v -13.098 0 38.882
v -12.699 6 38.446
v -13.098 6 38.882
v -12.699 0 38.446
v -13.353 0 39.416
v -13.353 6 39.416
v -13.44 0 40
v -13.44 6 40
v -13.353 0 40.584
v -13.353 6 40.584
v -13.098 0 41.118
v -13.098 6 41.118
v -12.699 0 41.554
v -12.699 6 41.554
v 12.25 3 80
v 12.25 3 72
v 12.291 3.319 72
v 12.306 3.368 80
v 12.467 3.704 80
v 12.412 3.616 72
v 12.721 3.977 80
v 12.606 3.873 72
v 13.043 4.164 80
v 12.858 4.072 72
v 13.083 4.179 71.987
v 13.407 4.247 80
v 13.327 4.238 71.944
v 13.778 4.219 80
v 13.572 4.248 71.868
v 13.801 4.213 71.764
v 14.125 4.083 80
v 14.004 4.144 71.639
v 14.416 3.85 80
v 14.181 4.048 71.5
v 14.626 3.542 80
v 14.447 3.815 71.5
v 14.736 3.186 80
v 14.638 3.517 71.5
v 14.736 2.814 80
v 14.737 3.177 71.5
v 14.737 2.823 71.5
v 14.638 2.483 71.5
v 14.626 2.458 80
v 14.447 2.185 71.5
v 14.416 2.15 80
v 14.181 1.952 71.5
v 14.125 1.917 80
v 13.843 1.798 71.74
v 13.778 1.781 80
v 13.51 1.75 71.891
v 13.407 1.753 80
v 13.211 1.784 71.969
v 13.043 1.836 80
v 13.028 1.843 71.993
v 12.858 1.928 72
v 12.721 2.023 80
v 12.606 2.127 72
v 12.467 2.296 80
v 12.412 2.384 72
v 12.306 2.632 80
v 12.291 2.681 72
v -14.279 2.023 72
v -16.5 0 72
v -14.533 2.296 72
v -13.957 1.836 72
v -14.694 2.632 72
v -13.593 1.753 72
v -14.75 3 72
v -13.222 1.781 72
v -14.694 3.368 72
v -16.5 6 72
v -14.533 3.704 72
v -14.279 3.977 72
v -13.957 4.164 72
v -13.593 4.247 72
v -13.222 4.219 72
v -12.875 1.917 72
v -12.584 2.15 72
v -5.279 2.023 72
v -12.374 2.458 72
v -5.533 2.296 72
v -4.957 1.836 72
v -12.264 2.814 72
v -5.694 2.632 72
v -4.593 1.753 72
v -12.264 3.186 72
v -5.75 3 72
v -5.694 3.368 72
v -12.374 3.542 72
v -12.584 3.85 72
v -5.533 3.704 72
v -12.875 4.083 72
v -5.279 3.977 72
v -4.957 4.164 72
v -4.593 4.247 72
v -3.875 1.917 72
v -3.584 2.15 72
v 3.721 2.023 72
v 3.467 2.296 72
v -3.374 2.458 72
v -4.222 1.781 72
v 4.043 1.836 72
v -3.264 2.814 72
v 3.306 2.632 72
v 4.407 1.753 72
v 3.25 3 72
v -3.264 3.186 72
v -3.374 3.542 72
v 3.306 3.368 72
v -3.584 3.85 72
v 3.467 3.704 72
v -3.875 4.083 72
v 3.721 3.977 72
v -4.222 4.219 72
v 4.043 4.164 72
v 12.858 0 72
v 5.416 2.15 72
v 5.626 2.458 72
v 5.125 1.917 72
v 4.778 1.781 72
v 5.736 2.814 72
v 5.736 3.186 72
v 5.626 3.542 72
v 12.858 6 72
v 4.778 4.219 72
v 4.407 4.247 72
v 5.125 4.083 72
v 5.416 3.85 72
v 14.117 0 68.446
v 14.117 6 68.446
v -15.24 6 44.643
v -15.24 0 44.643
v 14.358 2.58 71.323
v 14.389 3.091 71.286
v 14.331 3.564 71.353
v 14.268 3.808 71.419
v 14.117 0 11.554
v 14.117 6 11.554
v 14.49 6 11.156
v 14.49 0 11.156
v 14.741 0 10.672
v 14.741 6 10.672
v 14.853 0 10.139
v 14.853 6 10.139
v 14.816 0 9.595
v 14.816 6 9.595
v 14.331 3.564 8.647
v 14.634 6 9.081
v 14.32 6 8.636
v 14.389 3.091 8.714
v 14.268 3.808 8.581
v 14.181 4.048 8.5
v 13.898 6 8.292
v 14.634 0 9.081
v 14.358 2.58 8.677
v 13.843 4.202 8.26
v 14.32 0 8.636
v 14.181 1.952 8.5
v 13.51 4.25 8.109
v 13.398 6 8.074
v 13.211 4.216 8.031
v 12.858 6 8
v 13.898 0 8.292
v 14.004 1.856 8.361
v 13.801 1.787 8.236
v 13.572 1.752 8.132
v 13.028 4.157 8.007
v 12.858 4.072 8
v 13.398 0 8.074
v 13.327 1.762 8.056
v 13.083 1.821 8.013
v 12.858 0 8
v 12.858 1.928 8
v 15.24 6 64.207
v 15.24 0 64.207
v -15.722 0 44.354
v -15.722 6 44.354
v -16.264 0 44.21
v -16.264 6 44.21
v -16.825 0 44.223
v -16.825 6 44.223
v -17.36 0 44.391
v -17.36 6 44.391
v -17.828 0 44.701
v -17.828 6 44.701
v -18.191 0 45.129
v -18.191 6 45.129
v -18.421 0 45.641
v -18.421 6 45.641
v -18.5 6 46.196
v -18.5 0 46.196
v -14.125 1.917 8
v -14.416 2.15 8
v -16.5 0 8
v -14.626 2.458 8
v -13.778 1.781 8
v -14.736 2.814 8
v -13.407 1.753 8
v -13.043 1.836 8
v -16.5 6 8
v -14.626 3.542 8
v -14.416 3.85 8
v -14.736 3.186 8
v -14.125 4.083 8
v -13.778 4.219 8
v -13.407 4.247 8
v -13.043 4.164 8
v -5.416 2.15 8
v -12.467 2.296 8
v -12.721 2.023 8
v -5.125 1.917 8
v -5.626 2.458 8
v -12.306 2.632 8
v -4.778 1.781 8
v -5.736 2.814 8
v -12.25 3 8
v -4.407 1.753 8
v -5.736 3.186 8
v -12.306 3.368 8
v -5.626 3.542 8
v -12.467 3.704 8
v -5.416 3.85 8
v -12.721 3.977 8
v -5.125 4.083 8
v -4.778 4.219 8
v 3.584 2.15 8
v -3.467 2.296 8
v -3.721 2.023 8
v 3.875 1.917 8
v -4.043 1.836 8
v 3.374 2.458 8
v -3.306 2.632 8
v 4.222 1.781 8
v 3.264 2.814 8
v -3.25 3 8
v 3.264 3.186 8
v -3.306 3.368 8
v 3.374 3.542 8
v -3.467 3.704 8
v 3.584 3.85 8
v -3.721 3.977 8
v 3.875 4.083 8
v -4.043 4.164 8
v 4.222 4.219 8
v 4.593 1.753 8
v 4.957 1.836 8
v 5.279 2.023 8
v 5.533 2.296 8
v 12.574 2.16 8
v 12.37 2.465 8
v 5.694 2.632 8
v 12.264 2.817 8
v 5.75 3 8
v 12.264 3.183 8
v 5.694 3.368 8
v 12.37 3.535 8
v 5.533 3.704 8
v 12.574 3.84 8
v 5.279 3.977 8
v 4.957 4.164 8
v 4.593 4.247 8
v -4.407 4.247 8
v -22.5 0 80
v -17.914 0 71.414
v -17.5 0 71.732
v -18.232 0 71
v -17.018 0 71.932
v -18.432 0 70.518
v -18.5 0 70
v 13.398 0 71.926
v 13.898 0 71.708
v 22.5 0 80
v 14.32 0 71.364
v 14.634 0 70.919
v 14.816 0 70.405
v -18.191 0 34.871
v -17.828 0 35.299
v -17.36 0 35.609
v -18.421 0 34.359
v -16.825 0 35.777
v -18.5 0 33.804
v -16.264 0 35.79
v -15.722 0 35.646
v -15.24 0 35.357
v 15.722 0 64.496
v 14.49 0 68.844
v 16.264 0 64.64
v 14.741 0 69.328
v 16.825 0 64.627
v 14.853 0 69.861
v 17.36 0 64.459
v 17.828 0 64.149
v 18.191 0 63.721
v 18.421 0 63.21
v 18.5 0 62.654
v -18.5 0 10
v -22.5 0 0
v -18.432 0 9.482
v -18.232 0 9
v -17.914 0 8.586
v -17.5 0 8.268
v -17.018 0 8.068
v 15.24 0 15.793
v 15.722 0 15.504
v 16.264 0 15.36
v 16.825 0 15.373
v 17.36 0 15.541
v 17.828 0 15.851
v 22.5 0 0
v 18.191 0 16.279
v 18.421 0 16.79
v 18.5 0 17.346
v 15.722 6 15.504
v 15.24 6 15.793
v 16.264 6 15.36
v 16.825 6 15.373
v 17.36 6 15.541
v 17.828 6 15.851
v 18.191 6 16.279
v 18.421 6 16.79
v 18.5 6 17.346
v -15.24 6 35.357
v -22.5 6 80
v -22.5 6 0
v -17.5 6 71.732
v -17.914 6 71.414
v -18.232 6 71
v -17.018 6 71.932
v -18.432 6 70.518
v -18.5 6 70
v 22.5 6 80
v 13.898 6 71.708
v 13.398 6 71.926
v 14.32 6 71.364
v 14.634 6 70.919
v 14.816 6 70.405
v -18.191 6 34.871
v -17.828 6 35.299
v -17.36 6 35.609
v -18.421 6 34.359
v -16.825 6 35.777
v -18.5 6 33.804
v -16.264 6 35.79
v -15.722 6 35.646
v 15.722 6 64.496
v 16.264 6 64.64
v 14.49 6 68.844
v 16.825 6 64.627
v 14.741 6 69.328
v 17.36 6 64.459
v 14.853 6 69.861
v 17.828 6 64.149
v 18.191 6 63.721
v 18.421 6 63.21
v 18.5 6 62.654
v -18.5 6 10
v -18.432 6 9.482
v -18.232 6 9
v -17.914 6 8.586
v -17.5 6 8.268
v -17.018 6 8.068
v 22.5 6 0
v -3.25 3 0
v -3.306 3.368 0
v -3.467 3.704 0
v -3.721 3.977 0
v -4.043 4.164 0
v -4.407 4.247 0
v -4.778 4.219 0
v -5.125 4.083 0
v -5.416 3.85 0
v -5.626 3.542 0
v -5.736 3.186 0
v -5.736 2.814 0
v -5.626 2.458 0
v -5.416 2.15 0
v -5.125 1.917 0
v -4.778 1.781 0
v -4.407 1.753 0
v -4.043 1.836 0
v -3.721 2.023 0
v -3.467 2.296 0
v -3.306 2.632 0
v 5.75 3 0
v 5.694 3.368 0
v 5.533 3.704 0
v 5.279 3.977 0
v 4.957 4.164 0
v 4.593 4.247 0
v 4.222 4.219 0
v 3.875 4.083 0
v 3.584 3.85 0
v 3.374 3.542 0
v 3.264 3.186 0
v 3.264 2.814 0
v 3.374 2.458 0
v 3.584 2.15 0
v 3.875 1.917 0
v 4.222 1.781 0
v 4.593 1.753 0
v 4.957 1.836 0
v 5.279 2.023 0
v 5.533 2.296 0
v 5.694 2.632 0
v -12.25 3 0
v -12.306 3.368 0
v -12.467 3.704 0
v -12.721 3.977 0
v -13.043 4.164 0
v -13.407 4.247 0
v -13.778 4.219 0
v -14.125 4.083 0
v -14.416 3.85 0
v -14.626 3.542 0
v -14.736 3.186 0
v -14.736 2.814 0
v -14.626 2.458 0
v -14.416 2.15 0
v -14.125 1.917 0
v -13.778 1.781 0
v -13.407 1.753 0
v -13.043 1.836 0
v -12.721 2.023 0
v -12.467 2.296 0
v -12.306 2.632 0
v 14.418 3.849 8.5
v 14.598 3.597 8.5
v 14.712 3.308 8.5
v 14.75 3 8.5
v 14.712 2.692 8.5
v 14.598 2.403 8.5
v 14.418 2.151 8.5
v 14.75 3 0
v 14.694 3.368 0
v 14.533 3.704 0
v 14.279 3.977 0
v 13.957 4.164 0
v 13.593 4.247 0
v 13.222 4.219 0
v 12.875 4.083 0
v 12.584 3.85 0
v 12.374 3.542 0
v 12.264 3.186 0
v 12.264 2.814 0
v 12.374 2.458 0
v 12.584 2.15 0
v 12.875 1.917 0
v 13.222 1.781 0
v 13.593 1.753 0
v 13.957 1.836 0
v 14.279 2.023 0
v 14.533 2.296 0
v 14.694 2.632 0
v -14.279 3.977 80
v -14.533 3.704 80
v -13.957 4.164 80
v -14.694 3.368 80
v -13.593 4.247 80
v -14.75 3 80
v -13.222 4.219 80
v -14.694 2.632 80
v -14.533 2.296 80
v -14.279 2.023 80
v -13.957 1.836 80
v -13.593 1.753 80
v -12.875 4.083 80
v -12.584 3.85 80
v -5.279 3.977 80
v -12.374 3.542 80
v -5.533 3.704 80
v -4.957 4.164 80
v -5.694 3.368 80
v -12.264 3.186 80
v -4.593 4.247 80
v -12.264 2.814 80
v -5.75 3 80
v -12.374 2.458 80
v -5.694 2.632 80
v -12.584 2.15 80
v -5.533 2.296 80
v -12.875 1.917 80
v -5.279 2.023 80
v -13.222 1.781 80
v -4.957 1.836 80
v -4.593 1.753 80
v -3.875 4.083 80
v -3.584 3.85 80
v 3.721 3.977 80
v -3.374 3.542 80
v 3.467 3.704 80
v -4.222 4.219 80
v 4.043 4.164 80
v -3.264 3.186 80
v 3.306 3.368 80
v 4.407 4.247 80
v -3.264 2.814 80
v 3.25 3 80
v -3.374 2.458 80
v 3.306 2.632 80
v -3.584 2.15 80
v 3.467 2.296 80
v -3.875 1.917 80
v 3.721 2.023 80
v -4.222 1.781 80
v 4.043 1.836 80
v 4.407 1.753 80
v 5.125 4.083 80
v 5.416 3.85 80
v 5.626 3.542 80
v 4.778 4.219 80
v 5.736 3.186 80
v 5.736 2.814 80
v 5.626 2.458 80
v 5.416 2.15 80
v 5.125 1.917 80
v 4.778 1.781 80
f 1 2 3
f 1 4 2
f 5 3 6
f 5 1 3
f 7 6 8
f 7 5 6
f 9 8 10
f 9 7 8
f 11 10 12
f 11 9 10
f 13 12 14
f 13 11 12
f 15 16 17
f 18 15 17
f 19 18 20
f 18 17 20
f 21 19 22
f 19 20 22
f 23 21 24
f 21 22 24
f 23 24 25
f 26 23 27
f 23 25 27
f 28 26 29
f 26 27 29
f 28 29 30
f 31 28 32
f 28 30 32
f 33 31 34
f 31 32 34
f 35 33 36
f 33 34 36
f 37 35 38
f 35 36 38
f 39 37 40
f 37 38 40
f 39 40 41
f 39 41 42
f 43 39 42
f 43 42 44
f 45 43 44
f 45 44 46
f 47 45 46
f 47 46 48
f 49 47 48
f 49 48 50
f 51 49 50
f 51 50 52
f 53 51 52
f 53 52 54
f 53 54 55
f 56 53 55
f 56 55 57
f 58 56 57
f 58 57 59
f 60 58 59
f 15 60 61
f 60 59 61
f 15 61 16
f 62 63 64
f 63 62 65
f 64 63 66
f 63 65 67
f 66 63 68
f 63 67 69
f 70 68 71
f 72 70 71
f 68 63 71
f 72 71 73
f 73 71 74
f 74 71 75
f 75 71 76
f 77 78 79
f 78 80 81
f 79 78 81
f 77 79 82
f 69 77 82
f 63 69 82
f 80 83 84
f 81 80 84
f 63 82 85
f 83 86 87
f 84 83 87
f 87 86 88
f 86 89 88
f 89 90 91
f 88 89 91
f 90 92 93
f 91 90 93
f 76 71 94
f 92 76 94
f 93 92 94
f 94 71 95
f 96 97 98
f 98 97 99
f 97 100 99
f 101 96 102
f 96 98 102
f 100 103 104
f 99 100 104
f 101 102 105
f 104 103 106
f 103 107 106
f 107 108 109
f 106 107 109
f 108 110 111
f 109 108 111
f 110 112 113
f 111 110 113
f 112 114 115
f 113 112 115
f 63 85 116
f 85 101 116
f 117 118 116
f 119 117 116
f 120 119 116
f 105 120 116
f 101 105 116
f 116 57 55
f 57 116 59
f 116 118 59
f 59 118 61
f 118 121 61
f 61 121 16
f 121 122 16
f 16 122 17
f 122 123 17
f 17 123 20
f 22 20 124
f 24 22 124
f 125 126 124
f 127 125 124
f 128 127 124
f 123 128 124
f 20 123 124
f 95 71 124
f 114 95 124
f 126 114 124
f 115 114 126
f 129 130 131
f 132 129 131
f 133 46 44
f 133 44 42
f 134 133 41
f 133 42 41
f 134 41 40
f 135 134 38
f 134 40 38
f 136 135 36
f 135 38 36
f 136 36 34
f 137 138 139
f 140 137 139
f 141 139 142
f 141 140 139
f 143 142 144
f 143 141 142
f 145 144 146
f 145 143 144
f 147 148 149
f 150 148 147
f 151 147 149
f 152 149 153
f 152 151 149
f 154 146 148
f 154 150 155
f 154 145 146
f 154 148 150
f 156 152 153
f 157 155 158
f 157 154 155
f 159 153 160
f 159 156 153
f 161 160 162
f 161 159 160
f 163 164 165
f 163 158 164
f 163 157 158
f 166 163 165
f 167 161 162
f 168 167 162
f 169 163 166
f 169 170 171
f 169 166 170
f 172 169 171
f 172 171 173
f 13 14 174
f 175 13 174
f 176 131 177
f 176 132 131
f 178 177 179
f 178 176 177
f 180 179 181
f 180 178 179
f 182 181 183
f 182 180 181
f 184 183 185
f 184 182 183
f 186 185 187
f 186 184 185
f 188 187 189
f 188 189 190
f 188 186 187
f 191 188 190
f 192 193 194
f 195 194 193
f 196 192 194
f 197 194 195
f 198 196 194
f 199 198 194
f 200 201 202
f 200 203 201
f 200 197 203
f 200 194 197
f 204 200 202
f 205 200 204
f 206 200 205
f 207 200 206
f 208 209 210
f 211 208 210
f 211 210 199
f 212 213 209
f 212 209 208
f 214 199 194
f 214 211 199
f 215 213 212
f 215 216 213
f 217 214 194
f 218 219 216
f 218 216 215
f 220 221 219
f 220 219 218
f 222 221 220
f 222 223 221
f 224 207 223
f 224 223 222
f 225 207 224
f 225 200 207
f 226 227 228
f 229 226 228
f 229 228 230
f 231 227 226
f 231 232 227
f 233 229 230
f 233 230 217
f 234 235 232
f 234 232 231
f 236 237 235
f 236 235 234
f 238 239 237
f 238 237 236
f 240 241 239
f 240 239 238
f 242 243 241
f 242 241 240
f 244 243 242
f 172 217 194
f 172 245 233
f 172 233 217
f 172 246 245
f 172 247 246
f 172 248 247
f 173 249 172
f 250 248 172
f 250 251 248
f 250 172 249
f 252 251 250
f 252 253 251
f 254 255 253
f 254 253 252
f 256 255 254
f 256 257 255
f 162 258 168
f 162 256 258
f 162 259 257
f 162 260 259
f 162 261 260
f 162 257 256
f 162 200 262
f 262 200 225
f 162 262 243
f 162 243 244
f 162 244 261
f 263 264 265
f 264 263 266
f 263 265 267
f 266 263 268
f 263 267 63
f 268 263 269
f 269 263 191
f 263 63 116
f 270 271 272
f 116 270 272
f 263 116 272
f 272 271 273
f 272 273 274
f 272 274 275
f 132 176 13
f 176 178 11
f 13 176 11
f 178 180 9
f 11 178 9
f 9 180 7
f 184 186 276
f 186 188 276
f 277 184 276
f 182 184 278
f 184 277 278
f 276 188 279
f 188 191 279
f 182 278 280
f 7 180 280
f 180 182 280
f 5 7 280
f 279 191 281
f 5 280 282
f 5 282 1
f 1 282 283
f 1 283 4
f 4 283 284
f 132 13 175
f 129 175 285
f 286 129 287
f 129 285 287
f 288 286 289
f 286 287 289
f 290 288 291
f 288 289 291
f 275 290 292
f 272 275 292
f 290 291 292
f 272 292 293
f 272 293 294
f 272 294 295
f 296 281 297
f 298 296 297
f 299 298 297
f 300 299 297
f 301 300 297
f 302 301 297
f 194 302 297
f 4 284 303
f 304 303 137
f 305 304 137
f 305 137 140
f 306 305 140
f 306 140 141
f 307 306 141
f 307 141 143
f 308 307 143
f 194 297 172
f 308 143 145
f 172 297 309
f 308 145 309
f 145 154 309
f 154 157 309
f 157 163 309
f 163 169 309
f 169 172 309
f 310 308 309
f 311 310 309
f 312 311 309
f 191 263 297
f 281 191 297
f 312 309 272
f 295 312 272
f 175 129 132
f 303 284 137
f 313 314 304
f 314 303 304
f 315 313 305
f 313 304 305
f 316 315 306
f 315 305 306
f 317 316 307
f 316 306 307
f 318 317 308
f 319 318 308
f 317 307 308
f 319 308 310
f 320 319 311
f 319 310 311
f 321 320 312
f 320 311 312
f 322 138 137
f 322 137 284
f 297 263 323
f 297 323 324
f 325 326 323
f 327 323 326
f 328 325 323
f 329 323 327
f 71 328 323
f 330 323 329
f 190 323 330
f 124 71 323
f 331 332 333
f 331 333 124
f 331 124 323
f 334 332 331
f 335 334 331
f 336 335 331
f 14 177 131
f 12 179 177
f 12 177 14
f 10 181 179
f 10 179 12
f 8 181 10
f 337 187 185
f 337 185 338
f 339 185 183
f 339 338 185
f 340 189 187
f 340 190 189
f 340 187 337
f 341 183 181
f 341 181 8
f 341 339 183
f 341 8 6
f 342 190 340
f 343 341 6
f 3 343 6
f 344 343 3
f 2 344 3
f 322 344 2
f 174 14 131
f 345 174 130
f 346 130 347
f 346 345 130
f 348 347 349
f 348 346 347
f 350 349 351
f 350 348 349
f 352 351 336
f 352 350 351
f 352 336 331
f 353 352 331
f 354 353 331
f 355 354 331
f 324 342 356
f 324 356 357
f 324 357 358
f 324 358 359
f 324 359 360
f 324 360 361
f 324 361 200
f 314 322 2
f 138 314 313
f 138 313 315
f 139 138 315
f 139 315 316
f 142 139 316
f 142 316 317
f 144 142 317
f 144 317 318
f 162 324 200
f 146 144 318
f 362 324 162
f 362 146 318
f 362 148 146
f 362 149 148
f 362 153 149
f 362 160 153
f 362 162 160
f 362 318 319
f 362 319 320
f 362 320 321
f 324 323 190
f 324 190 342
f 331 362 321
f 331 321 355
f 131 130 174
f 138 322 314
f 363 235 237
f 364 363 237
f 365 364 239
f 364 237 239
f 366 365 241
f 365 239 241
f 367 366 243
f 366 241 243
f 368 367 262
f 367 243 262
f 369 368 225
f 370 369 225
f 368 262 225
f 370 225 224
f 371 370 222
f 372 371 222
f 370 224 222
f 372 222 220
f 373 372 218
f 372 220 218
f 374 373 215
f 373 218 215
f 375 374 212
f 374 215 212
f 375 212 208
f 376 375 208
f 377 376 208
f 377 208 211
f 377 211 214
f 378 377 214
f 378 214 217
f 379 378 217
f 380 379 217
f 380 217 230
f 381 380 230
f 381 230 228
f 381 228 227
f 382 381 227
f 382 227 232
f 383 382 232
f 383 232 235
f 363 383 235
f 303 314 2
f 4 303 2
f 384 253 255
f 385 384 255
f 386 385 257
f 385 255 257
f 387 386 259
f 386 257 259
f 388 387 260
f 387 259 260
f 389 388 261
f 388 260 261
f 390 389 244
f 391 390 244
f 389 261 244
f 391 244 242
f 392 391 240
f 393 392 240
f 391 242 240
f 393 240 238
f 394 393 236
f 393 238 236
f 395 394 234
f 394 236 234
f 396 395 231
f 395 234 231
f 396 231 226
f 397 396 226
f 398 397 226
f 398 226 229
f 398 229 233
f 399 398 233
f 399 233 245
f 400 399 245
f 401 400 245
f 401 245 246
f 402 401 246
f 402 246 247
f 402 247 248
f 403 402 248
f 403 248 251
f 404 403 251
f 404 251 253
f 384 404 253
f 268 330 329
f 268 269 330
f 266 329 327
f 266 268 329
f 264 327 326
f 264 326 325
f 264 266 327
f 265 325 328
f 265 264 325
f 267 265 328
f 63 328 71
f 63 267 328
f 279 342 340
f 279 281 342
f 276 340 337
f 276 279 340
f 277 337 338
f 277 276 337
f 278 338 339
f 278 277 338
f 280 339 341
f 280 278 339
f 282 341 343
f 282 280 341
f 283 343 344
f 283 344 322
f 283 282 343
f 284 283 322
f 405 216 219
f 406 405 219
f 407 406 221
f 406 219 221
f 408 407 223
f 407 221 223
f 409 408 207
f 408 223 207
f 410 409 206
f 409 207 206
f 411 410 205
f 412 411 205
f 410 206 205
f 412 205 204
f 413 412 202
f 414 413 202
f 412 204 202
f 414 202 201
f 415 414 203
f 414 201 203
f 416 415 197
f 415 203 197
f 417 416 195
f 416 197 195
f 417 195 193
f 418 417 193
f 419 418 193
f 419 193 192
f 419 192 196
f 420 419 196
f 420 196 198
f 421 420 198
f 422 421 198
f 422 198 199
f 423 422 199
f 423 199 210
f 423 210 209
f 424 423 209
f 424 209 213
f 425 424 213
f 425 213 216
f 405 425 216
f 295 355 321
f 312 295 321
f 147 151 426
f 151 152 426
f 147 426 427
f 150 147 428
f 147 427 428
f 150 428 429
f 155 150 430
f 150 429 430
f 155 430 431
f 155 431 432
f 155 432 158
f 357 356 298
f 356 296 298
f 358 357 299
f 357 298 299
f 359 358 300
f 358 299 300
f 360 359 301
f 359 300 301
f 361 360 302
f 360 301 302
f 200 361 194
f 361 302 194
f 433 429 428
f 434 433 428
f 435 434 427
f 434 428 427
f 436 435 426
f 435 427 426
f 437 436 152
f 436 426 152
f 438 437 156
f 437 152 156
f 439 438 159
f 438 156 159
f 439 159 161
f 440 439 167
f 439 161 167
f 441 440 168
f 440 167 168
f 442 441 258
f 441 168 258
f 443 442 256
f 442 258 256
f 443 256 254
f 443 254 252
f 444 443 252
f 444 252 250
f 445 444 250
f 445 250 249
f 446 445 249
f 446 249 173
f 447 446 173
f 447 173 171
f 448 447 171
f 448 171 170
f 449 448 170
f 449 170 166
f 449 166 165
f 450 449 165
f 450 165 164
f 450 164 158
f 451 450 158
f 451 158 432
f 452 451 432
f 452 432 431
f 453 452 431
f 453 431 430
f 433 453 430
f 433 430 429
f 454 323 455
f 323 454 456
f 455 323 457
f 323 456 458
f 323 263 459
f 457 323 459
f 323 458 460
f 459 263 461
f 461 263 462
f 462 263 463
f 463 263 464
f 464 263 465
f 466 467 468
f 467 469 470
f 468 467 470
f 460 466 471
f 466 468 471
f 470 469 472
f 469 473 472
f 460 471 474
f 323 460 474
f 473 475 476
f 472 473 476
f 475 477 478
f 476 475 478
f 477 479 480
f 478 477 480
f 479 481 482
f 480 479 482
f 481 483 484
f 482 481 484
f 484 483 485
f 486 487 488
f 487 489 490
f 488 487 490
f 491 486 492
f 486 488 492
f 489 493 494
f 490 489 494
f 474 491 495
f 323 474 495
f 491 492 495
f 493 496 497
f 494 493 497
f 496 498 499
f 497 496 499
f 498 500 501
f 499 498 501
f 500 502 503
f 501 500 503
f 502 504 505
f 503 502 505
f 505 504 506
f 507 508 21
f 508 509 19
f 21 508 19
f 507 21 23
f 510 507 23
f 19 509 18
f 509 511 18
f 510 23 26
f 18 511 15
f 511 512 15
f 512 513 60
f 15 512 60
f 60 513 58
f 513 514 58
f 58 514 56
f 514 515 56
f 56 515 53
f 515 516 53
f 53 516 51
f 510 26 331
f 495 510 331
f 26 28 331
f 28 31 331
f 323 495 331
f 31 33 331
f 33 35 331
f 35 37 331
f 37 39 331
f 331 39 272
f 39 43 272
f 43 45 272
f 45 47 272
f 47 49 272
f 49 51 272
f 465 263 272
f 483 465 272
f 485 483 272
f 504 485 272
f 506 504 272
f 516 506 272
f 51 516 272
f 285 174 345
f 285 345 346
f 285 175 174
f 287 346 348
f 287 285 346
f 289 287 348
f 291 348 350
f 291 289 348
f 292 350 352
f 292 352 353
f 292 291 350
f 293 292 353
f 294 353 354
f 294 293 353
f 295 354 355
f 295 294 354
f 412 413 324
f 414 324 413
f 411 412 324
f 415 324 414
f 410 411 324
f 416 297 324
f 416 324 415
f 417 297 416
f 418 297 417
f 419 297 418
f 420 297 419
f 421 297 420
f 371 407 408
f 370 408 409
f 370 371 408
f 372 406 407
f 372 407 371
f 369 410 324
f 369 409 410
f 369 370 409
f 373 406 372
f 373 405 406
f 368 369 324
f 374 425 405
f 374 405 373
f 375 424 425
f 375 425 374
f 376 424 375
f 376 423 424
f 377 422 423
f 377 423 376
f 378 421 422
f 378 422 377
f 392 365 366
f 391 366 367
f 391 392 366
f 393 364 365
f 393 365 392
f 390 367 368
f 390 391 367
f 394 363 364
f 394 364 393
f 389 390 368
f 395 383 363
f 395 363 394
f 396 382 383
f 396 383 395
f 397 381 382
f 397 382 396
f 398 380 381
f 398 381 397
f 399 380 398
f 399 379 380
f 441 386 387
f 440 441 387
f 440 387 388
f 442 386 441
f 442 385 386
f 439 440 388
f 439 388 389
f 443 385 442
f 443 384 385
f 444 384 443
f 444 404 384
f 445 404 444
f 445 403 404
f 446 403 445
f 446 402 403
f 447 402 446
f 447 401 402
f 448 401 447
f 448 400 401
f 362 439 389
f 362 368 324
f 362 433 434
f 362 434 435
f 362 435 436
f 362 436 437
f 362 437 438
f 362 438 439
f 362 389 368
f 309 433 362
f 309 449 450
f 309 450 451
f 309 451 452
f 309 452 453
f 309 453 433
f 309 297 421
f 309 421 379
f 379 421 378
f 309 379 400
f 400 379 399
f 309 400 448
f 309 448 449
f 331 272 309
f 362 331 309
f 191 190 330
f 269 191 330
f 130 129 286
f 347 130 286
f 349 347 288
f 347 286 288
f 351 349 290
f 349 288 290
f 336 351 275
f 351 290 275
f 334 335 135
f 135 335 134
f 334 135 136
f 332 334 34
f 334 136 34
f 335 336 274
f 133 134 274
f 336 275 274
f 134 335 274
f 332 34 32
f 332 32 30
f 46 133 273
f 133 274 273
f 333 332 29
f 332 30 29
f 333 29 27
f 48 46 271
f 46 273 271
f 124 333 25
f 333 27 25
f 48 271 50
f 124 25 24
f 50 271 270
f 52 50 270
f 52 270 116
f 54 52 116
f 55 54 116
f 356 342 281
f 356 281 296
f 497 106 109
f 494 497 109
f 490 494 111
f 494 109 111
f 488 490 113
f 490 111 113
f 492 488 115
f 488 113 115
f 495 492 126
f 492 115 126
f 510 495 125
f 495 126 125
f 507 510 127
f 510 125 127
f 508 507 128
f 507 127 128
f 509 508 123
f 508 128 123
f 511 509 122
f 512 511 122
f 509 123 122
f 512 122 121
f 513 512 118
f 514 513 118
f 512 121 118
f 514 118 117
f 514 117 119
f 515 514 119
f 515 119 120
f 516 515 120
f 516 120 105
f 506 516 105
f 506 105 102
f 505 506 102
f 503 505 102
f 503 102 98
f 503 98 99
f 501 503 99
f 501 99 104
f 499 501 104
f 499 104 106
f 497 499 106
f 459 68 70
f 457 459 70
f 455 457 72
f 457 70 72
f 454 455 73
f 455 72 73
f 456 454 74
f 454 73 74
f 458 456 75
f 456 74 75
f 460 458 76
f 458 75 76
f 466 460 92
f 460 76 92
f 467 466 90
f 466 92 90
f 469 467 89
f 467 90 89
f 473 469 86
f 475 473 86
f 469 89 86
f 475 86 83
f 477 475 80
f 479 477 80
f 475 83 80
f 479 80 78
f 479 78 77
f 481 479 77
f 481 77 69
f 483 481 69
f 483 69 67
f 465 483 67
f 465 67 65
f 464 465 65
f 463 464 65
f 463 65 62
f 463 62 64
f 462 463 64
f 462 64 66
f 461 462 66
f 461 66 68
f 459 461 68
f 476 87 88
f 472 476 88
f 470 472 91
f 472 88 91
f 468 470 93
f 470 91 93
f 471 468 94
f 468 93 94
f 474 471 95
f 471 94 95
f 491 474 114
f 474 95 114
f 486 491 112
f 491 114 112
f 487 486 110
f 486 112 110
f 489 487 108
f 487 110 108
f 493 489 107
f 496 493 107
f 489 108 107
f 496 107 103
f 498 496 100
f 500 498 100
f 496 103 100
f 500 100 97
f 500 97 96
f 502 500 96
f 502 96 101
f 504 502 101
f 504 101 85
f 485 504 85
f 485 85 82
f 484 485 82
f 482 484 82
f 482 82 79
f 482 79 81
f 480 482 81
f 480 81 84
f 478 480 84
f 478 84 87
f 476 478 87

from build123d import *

# Parameters (mm, degrees)
SKETCH_1_W          = 45
SKETCH_1_H          = 80
EXTRUDE_1_DEPTH     = 6
CUT_EXTRUDE_2_DEPTH = 84.320165626
FILLET_10_R         = 2
M3X0_52_D           = 2.5
M3X0_52_DEPTH       = 8.5
M3X0_52_TIP         = 0.751075774
M3X0_51_D           = 2.5
M3X0_51_DEPTH       = 8.5
M3X0_51_TIP         = 0.751075774


with BuildPart() as part:
    # Эскиз1 → Бобышка-Вытянуть1 (new body)
    with BuildSketch(Plane(origin=(0, 0, 0), x_dir=(1, 0, 0), z_dir=(0, 1, 0))):
        with Locations((0, -40)):
            Rectangle(SKETCH_1_W, SKETCH_1_H)
    extrude(amount=EXTRUDE_1_DEPTH)

    # Эскиз13 → Вырез-Вытянуть2 (cut, through all)
    with BuildSketch(Plane(origin=(0, 6, 0), x_dir=(1, 0, 0), z_dir=(0, 1, 0))):
        Polygon((-18.5, -8), (18.5, -8), (-18.5, -38), align=None)
        Polygon((18.5, -72), (-18.5, -42), (-18.5, -72), align=None)
        Polygon((18.5, -13.149623941), (-14.615463806, -40), (18.5, -66.850376059), align=None)
    extrude(amount=-CUT_EXTRUDE_2_DEPTH, mode=Mode.SUBTRACT)

    # Скругление10
    fillet_10_edges = [part.edges().sort_by_distance(p)[0] for p in [
        (18.5, 3, 72),
        (-18.5, 3, 72),
        (-18.5, 3, 42),
        (-18.5, 3, 38),
        (-18.5, 3, 8),
        (18.5, 3, 8),
        (18.5, 3, 13.149623941),
        (18.5, 3, 66.850376059),
        (-14.615463806, 3, 40),
    ]]
    fillet(fillet_10_edges, radius=FILLET_10_R)

    # Отверстие обработанное метчиком M3x0.52
    with Locations(Plane(origin=(0, 0, 0), x_dir=(-1, 0, 0), z_dir=(0, 0, -1))):
        with Locations((-13.5, 3), (-4.5, 3), (4.5, 3), (13.5, 3)):
            Hole(M3X0_52_D / 2, depth=M3X0_52_DEPTH)
            with Locations((0, 0, -(M3X0_52_DEPTH + M3X0_52_TIP / 2))):  # 118° drill point
                Cone(0, M3X0_52_D / 2, M3X0_52_TIP, mode=Mode.SUBTRACT)

    # Отверстие обработанное метчиком M3x0.51
    with Locations(Plane.XY.offset(80)):
        with Locations((-13.5, 3), (-4.5, 3), (4.5, 3), (13.5, 3)):
            Hole(M3X0_51_D / 2, depth=M3X0_51_DEPTH)
            with Locations((0, 0, -(M3X0_51_DEPTH + M3X0_51_TIP / 2))):  # 118° drill point
                Cone(0, M3X0_51_D / 2, M3X0_51_TIP, mode=Mode.SUBTRACT)


solid = part.part
